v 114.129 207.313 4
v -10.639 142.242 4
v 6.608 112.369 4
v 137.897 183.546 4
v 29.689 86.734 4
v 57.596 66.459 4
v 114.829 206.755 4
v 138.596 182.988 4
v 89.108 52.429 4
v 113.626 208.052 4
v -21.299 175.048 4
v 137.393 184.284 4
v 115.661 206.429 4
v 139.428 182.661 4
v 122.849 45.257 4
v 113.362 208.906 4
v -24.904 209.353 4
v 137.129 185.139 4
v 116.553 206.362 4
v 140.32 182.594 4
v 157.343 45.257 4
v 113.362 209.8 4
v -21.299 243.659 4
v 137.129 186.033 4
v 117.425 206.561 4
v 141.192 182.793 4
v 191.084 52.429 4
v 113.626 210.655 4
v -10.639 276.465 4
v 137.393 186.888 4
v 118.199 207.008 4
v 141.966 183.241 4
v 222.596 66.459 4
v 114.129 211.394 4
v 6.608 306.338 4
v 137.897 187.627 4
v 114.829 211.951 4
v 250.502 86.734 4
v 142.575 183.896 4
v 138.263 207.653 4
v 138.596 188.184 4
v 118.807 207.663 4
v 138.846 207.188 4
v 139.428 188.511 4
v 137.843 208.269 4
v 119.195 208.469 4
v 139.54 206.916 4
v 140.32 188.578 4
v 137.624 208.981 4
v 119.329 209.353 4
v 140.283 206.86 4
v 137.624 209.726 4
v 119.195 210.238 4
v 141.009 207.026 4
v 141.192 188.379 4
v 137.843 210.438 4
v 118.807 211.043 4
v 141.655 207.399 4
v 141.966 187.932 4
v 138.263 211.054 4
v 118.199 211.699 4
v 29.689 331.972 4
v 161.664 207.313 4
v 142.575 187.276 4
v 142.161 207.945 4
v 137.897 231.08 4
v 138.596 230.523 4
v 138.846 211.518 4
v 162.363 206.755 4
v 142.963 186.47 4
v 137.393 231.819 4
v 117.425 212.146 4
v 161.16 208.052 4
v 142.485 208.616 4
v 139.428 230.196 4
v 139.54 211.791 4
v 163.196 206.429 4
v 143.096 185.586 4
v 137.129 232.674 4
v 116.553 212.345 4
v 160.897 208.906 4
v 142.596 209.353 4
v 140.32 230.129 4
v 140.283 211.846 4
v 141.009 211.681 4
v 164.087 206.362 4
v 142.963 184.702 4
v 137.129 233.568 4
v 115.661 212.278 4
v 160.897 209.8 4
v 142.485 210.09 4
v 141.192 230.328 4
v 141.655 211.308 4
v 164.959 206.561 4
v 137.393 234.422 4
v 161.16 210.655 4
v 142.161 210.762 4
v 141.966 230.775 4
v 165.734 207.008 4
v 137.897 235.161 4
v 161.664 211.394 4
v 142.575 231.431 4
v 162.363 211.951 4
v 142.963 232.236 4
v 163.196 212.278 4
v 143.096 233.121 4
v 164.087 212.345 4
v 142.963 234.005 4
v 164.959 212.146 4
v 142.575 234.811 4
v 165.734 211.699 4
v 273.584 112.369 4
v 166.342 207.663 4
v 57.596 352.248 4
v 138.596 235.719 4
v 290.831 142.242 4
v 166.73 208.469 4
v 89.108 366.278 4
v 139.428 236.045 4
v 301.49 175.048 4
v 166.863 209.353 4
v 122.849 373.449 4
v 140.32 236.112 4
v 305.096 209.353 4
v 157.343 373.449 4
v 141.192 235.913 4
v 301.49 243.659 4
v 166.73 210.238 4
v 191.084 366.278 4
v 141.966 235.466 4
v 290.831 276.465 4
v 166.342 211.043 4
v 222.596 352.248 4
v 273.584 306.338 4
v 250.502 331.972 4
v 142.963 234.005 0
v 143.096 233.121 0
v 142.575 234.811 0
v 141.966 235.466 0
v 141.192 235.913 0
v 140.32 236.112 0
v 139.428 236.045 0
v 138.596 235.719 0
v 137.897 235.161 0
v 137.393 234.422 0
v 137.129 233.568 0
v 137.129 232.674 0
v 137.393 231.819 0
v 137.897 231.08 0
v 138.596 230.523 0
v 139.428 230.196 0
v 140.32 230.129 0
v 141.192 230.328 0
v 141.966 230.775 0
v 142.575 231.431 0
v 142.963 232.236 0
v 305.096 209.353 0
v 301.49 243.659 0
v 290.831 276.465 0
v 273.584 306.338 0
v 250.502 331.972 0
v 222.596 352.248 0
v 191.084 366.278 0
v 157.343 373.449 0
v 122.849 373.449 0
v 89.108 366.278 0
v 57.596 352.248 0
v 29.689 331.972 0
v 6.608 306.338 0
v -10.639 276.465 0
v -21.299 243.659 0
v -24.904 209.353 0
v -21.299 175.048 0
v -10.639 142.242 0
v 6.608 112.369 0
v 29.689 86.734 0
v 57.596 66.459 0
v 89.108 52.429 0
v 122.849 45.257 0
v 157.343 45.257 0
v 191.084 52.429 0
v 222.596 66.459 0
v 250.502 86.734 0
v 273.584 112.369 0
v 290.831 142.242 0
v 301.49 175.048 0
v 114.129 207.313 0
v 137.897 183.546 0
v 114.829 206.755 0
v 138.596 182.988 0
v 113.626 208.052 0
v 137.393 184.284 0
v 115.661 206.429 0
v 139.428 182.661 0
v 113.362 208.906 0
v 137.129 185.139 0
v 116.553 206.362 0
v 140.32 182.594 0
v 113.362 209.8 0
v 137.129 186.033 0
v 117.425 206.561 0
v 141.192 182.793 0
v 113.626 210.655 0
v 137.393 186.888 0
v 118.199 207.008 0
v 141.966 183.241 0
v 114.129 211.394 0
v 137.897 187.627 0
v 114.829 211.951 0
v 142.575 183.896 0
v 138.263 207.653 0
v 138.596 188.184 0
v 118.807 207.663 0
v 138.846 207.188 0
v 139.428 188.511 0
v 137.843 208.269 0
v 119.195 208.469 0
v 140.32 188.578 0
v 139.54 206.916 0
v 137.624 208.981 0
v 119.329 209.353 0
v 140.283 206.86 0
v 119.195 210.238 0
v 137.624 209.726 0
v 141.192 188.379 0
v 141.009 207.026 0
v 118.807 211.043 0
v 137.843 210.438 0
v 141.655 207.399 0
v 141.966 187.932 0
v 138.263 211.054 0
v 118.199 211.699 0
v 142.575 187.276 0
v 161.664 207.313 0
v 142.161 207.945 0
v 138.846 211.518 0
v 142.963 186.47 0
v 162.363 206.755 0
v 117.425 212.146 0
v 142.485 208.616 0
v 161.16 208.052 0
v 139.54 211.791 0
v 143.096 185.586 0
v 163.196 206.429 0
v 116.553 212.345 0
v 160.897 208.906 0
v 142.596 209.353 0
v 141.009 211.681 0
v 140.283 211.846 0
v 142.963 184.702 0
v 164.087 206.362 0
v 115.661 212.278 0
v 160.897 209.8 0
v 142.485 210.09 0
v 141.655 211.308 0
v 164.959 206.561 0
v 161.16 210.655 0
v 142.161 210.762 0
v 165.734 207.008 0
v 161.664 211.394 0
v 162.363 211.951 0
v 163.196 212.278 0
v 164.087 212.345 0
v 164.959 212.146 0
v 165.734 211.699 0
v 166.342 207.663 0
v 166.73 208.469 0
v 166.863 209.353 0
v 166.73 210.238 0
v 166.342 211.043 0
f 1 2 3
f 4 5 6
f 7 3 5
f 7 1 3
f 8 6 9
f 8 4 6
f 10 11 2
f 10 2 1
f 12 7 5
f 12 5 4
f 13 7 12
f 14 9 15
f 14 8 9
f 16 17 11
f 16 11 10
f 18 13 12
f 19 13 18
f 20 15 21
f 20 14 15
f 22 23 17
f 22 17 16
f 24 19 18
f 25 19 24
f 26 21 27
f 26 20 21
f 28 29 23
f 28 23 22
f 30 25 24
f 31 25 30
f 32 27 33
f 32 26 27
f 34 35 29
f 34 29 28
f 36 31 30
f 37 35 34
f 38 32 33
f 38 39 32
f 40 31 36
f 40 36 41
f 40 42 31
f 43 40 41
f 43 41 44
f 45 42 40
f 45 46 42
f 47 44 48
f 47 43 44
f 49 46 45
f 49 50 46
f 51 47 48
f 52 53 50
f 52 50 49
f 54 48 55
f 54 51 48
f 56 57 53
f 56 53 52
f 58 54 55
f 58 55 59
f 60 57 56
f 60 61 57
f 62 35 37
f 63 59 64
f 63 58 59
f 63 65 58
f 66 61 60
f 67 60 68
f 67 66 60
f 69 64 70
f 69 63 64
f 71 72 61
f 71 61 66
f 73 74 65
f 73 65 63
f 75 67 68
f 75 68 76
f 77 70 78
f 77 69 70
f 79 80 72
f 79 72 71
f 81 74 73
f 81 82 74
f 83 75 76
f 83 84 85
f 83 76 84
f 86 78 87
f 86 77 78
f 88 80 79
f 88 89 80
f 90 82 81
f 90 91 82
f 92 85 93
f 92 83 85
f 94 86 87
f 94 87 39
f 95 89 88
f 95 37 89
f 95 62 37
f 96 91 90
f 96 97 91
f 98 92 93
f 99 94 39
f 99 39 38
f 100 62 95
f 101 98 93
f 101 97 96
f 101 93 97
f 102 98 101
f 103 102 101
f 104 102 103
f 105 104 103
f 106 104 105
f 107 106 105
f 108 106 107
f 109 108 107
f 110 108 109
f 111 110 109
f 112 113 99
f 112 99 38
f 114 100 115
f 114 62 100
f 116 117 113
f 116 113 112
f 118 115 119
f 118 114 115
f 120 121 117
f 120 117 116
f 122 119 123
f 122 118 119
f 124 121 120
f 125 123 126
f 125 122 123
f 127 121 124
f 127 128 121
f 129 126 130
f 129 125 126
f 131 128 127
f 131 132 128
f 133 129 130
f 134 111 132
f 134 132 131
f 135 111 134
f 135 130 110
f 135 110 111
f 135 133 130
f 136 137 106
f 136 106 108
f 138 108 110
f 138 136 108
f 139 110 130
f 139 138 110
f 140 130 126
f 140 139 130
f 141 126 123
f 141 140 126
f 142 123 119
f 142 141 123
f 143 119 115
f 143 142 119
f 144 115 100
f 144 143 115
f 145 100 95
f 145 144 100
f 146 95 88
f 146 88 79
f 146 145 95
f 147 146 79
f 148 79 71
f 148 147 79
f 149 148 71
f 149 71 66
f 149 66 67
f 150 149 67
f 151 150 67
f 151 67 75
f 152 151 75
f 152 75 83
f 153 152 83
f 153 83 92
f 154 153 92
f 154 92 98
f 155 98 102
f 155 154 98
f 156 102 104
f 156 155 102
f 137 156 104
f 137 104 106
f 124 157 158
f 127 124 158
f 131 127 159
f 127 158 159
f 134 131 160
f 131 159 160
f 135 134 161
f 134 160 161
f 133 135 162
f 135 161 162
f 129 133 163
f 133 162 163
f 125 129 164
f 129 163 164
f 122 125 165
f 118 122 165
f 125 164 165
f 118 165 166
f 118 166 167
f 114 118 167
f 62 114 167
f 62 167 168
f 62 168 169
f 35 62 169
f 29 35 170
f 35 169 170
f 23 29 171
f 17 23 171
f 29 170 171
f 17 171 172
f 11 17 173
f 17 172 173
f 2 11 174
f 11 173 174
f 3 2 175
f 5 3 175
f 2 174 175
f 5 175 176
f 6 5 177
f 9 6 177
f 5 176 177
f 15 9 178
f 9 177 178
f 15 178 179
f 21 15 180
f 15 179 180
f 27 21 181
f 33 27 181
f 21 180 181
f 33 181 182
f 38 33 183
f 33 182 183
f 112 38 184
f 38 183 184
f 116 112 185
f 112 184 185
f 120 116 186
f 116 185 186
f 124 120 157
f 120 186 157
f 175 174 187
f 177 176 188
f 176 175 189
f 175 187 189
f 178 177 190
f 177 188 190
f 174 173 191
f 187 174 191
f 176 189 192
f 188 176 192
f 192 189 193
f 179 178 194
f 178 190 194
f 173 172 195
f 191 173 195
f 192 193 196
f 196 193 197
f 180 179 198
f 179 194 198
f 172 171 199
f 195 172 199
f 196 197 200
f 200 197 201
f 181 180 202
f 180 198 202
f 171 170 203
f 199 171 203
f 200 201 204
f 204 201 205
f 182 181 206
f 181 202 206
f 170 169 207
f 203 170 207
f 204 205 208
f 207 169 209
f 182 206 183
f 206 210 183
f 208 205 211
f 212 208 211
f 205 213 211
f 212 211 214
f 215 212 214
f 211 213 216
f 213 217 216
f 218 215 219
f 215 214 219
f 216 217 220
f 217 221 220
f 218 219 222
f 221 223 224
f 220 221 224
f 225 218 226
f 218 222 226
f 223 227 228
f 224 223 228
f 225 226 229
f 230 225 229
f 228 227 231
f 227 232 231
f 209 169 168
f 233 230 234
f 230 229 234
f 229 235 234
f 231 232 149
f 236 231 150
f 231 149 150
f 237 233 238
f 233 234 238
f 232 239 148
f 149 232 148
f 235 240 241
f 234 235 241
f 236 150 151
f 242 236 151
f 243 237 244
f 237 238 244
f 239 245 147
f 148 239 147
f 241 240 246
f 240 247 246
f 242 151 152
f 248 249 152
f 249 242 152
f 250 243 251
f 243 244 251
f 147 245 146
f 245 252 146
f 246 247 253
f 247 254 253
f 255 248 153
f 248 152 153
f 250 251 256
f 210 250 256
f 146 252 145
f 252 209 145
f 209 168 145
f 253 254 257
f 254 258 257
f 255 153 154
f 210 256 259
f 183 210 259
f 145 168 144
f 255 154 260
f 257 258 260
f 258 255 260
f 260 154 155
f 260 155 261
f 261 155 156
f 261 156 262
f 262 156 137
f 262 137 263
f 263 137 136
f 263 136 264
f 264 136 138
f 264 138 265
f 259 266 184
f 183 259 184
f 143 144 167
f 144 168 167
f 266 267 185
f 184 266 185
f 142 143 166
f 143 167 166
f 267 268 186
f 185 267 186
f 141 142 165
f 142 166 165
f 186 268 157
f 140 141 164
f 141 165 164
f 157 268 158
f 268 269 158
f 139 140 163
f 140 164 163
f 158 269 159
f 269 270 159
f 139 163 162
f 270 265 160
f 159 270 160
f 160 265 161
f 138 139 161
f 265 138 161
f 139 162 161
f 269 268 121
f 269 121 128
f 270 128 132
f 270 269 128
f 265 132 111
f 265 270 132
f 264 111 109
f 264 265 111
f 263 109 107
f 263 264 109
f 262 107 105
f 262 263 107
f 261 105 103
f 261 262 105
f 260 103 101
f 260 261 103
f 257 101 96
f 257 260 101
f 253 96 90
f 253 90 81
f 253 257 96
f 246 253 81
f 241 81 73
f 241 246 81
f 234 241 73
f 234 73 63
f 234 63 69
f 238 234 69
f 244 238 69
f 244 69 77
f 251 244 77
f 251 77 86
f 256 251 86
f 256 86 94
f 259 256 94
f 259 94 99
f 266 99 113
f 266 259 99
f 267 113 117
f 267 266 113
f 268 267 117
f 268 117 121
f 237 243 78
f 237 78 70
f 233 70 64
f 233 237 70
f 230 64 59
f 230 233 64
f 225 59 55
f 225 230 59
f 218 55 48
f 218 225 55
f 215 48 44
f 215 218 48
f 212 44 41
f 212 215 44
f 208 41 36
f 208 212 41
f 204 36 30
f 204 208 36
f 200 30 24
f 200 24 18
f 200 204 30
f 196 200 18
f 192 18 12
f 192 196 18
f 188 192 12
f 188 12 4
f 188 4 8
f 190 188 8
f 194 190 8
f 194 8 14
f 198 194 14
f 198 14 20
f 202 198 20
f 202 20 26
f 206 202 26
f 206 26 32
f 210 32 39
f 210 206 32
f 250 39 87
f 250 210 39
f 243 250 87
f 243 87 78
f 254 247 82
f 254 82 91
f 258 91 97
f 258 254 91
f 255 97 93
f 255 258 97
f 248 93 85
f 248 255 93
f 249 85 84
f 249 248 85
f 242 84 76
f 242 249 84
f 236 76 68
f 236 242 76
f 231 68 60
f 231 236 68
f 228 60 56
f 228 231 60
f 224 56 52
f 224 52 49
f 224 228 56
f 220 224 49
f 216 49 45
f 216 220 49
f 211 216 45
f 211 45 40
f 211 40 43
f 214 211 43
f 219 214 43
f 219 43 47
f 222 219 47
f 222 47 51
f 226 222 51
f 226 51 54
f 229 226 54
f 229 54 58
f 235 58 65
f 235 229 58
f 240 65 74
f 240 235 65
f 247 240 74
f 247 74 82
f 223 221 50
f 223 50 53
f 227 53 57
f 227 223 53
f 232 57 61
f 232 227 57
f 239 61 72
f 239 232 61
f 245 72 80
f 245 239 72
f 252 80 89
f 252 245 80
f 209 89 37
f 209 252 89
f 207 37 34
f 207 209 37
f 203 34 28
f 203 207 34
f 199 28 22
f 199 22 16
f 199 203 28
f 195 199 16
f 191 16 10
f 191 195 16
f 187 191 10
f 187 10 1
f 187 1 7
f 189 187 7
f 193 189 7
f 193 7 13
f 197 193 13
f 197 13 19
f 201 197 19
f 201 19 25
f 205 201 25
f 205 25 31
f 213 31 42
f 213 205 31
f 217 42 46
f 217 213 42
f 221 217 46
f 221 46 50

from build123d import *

# Parameters (mm, degrees)
F0_R     = 165
F0_R_2   = 3
F0_R_3   = 2.5
F1_DEPTH = 4


with BuildPart() as f1:
    # F0 (on Top) → F1 (new body)
    with BuildSketch(Plane.XY):
        with Locations((140.095845, 209.353372)):
            Circle(F0_R)
        with Locations((140.095845, 185.586029)):
            Circle(F0_R_2, mode=Mode.SUBTRACT)
        with Locations((116.328501, 209.353372)):
            Circle(F0_R_2, mode=Mode.SUBTRACT)
        with Locations((140.095845, 209.353372)):
            Circle(F0_R_3, mode=Mode.SUBTRACT)
        with Locations((163.863189, 209.353372)):
            Circle(F0_R_2, mode=Mode.SUBTRACT)
        with Locations((140.095845, 233.120716)):
            Circle(F0_R_2, mode=Mode.SUBTRACT)
    extrude(amount=F1_DEPTH)


solid = f1.part
